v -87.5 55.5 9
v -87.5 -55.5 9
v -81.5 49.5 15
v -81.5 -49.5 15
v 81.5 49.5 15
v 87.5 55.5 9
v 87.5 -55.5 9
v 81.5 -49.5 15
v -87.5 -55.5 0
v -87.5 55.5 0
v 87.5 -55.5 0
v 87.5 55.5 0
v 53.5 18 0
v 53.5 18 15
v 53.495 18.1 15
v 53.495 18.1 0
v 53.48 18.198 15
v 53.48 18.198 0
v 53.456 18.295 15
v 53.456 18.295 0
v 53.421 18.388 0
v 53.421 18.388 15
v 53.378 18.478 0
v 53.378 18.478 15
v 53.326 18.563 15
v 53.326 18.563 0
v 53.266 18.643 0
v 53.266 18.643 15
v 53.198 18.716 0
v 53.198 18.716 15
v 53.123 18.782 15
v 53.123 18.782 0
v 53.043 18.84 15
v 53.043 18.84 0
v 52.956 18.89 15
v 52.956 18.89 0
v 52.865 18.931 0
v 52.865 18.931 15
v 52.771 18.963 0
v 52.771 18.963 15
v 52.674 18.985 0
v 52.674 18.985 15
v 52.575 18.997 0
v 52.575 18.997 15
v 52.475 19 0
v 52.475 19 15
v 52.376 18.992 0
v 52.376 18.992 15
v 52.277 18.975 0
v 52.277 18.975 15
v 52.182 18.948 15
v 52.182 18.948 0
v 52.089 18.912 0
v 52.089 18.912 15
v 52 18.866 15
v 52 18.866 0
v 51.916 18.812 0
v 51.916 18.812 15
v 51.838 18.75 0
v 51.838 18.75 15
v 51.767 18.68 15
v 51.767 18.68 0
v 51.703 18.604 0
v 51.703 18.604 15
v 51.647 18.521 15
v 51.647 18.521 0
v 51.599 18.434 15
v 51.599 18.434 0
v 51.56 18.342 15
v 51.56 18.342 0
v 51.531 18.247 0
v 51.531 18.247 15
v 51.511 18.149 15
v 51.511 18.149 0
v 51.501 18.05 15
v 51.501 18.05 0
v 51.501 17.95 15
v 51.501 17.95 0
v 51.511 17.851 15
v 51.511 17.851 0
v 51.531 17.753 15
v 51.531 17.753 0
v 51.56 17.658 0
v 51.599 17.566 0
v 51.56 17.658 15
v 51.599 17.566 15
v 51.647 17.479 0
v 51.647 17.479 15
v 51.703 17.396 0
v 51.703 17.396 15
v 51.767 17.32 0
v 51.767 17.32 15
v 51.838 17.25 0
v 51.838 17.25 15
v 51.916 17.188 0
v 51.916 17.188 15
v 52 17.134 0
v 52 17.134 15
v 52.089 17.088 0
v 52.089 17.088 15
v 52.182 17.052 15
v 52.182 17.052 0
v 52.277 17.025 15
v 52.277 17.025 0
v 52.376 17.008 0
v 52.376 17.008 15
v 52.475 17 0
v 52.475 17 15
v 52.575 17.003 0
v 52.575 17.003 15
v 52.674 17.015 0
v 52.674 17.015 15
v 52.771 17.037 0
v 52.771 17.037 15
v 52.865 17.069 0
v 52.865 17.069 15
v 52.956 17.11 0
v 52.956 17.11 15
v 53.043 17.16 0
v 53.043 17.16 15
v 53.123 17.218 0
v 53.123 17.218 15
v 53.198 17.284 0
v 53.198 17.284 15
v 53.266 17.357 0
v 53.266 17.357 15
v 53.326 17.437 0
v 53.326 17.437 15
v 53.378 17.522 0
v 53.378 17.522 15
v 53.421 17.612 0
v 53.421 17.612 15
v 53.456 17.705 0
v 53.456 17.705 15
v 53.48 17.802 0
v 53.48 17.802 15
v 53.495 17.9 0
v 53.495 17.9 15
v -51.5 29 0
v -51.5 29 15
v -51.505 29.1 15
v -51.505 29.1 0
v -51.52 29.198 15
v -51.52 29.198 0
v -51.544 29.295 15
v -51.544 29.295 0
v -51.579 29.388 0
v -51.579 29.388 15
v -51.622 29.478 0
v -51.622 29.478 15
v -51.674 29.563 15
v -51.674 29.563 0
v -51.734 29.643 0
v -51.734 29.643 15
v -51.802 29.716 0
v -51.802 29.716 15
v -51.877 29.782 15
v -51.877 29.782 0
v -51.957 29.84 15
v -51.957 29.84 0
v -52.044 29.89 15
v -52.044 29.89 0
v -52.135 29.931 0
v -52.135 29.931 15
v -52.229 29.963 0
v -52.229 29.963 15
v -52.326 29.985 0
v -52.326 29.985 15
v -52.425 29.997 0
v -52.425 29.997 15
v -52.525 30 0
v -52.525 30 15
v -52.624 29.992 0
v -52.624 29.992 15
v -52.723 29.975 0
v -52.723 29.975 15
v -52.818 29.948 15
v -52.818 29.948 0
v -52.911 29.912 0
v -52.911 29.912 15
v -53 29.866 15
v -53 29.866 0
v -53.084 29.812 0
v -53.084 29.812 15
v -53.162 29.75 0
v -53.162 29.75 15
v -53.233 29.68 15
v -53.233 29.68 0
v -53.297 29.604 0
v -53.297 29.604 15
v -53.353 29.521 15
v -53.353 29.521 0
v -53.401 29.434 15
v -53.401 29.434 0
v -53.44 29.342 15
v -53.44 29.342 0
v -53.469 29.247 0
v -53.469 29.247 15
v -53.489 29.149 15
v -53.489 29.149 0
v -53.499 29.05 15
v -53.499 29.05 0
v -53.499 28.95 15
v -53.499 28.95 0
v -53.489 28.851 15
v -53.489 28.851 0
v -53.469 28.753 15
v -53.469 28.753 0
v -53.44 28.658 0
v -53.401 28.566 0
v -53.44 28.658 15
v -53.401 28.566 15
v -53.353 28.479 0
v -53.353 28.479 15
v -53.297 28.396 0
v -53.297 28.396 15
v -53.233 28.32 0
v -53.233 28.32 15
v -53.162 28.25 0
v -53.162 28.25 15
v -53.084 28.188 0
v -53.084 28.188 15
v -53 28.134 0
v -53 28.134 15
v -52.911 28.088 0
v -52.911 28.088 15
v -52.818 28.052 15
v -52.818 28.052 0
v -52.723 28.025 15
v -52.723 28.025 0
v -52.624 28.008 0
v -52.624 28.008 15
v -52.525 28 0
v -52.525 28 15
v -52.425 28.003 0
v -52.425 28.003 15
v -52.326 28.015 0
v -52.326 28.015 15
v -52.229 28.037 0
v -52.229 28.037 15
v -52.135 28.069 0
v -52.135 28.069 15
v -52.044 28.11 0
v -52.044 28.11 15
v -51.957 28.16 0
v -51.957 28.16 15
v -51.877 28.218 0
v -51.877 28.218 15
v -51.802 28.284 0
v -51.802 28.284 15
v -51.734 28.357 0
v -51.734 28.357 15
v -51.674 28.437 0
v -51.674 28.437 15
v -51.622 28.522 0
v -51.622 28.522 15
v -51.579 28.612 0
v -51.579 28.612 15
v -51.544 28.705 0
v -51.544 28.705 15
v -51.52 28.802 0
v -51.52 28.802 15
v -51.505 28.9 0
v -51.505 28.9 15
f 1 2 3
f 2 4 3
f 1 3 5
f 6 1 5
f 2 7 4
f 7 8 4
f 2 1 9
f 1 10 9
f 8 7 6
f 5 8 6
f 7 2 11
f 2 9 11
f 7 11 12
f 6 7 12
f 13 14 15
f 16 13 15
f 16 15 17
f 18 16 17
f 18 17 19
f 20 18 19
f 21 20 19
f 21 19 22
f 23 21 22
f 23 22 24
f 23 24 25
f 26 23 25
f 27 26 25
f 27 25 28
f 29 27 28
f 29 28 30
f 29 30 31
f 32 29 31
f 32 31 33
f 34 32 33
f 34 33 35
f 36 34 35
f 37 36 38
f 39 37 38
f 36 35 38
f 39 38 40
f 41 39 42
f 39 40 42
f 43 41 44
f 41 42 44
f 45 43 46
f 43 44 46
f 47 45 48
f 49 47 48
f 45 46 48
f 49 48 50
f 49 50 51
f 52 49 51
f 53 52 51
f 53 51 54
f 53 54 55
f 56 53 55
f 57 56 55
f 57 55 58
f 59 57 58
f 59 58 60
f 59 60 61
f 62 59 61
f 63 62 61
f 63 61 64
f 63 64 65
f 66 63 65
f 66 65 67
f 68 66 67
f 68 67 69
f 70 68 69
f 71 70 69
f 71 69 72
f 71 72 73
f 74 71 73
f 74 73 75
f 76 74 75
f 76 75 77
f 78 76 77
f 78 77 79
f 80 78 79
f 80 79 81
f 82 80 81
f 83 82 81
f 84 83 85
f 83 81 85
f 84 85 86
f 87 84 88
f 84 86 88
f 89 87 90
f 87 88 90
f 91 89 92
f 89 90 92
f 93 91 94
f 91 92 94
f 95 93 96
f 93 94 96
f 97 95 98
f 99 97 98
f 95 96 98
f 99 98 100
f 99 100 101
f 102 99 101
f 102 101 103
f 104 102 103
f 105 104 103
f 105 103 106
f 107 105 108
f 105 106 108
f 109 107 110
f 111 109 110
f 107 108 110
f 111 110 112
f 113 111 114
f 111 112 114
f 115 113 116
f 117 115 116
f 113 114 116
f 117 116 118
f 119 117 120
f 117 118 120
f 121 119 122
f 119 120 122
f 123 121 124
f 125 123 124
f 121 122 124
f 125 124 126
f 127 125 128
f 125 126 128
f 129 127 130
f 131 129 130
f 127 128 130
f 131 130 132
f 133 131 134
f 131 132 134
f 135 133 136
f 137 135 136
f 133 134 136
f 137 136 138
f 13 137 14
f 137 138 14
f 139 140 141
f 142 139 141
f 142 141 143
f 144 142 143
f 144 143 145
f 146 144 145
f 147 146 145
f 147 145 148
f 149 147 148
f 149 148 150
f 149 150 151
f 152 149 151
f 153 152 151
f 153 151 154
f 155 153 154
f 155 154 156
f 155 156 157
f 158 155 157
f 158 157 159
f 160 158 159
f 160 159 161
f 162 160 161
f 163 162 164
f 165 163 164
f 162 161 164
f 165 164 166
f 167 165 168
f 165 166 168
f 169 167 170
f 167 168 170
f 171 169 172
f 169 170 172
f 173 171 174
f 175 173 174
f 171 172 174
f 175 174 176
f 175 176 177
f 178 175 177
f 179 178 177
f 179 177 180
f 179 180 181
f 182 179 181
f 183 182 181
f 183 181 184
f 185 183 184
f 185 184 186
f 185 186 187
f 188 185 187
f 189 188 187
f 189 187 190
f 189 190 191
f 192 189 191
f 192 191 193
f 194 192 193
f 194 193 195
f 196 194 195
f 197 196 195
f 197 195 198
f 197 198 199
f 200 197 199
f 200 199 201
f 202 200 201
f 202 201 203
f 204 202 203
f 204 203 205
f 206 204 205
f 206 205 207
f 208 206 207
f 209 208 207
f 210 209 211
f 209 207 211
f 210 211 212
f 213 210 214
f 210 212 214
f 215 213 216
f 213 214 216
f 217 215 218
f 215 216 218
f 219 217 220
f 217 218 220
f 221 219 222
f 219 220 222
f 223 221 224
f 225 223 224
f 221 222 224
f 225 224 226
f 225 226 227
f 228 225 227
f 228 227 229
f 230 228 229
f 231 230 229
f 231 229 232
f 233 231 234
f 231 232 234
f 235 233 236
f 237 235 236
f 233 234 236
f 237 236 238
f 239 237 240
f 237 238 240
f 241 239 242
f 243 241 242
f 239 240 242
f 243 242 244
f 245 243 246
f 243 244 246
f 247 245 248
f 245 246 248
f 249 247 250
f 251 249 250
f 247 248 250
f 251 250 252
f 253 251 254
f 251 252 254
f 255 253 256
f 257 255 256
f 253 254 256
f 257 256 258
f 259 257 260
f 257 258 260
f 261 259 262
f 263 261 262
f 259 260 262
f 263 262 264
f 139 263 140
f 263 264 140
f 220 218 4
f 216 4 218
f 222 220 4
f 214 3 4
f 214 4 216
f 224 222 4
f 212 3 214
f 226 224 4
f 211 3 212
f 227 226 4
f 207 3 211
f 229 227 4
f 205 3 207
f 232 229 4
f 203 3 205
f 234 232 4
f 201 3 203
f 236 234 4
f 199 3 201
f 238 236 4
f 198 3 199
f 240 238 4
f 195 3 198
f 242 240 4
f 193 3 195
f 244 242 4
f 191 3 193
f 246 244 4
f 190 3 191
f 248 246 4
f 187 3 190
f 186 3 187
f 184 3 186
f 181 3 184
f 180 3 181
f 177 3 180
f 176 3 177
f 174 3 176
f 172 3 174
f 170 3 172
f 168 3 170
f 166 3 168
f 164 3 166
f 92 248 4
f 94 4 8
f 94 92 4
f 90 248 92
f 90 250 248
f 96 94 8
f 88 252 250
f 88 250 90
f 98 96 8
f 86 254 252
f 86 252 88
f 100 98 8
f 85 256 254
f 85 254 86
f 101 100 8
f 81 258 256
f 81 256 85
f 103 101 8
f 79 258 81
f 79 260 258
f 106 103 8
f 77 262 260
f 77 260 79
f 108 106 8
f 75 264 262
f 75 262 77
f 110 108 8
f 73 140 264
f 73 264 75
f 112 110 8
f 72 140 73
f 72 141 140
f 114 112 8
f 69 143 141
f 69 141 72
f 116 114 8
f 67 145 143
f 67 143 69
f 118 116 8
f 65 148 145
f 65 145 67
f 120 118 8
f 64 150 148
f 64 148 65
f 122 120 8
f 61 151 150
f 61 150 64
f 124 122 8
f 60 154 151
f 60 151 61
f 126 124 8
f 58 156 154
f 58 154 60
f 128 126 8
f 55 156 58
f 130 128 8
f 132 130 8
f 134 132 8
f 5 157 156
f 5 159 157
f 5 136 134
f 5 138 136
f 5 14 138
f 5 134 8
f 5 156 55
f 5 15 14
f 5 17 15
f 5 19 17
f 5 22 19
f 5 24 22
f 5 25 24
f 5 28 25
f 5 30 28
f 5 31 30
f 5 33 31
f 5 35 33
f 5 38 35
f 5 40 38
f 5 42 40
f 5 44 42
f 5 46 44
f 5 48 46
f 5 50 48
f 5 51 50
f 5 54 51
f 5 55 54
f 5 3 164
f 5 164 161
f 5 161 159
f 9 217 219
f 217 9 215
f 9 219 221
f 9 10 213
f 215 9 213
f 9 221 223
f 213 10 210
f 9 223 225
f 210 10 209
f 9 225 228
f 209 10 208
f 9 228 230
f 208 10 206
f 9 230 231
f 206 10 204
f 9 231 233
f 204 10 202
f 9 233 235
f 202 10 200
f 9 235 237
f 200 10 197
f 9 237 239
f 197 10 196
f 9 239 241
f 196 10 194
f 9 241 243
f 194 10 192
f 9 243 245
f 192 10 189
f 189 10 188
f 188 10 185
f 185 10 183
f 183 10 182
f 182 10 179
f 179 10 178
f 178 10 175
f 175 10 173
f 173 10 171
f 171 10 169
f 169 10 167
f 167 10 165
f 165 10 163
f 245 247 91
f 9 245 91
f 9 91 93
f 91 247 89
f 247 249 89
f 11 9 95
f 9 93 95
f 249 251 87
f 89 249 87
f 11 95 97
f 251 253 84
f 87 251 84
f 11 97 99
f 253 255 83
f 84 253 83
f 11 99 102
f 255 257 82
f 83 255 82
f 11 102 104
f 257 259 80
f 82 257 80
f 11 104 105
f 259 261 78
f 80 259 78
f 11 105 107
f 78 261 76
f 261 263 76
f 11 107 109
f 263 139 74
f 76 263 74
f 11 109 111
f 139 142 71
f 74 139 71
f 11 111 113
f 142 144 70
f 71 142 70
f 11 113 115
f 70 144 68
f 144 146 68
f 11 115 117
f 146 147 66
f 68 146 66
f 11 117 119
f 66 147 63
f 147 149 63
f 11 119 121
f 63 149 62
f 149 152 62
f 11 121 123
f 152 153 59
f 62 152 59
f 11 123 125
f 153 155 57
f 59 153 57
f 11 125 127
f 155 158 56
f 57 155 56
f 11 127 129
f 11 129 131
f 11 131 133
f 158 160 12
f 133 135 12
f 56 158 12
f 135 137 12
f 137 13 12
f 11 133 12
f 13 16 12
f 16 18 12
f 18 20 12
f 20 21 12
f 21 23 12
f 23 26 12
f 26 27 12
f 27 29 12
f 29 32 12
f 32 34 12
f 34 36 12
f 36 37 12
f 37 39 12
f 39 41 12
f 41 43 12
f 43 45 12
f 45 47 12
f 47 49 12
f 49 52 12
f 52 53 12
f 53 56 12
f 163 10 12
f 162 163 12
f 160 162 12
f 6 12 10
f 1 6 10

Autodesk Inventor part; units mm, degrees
ref_plane "YZ Plane" through (0, 0, 0) normal (1, 0, 0) x (0, 1, 0)
ref_plane "XZ Plane" through (0, 0, 0) normal (0, 1, 0) x (-1, 0, 0)
ref_plane "XY Plane" through (0, 0, 0) normal (0, 0, 1) x (1, 0, 0)
sketch "Skizze1" plane through (0, 0, 0) normal (0, 0, 1) x (1, 0, 0)
  line L0 (-87.5, -55.5) -> (87.5, -55.5)
  line L1 (87.5, -55.5) -> (87.5, 55.5)
  line L2 (87.5, 55.5) -> (-87.5, 55.5)
  line L3 (-87.5, 55.5) -> (-87.5, -55.5)
  line L4 (-87.5, -55.5) -> (87.5, 55.5) construction
  line L5 (87.5, -55.5) -> (-87.5, 55.5) construction
  point P0 (0, 0)
  dimension "d0" = 175
  dimension "d1" = 111
extrude "Extrusion1" add sketch "Skizze1" along normal blind 15
sketch "Skizze2" plane through (0, 0, 15) normal (0, 0, 1) x (1, 0, 0)
  line L0 (87.5, 55.5) -> (-87.5, 55.5) projected
  line L1 (-87.5, 55.5) -> (-52.5, 55.5) construction
  line L2 (-52.5, 55.5) -> (-52.5, 29) construction
  line L3 (-52.5, 29) -> (-87.5, 29) construction
  line L4 (-87.5, 29) -> (-87.5, 55.5) construction
  line L5 (87.5, 55.5) -> (52.5, 55.5) construction
  line L6 (52.5, 55.5) -> (52.5, 18) construction
  line L7 (52.5, 18) -> (87.5, 18) construction
  line L8 (87.5, 18) -> (87.5, 55.5) construction
  circle A0 centre (-52.5, 29) radius 1
  circle A1 centre (52.5, 18) radius 1
  point P0 (0, 0)
  dimension "d4" = 35
  dimension "d5" = 26.5
  dimension "d6" = 35
  dimension "d7" = 37.5
  dimension "d8" = 2
  dimension "d9" = 2
extrude "Extrusion2" cut sketch "Skizze2" against normal blind 19.5
chamfer "Fasen1" distance 6 angle 45 4 edges at (-87.5, 0, 15) (0, -55.5, 15) (87.5, 0, 15) (0, 55.5, 15)
properties part number "sf_Wood_Base_1"
